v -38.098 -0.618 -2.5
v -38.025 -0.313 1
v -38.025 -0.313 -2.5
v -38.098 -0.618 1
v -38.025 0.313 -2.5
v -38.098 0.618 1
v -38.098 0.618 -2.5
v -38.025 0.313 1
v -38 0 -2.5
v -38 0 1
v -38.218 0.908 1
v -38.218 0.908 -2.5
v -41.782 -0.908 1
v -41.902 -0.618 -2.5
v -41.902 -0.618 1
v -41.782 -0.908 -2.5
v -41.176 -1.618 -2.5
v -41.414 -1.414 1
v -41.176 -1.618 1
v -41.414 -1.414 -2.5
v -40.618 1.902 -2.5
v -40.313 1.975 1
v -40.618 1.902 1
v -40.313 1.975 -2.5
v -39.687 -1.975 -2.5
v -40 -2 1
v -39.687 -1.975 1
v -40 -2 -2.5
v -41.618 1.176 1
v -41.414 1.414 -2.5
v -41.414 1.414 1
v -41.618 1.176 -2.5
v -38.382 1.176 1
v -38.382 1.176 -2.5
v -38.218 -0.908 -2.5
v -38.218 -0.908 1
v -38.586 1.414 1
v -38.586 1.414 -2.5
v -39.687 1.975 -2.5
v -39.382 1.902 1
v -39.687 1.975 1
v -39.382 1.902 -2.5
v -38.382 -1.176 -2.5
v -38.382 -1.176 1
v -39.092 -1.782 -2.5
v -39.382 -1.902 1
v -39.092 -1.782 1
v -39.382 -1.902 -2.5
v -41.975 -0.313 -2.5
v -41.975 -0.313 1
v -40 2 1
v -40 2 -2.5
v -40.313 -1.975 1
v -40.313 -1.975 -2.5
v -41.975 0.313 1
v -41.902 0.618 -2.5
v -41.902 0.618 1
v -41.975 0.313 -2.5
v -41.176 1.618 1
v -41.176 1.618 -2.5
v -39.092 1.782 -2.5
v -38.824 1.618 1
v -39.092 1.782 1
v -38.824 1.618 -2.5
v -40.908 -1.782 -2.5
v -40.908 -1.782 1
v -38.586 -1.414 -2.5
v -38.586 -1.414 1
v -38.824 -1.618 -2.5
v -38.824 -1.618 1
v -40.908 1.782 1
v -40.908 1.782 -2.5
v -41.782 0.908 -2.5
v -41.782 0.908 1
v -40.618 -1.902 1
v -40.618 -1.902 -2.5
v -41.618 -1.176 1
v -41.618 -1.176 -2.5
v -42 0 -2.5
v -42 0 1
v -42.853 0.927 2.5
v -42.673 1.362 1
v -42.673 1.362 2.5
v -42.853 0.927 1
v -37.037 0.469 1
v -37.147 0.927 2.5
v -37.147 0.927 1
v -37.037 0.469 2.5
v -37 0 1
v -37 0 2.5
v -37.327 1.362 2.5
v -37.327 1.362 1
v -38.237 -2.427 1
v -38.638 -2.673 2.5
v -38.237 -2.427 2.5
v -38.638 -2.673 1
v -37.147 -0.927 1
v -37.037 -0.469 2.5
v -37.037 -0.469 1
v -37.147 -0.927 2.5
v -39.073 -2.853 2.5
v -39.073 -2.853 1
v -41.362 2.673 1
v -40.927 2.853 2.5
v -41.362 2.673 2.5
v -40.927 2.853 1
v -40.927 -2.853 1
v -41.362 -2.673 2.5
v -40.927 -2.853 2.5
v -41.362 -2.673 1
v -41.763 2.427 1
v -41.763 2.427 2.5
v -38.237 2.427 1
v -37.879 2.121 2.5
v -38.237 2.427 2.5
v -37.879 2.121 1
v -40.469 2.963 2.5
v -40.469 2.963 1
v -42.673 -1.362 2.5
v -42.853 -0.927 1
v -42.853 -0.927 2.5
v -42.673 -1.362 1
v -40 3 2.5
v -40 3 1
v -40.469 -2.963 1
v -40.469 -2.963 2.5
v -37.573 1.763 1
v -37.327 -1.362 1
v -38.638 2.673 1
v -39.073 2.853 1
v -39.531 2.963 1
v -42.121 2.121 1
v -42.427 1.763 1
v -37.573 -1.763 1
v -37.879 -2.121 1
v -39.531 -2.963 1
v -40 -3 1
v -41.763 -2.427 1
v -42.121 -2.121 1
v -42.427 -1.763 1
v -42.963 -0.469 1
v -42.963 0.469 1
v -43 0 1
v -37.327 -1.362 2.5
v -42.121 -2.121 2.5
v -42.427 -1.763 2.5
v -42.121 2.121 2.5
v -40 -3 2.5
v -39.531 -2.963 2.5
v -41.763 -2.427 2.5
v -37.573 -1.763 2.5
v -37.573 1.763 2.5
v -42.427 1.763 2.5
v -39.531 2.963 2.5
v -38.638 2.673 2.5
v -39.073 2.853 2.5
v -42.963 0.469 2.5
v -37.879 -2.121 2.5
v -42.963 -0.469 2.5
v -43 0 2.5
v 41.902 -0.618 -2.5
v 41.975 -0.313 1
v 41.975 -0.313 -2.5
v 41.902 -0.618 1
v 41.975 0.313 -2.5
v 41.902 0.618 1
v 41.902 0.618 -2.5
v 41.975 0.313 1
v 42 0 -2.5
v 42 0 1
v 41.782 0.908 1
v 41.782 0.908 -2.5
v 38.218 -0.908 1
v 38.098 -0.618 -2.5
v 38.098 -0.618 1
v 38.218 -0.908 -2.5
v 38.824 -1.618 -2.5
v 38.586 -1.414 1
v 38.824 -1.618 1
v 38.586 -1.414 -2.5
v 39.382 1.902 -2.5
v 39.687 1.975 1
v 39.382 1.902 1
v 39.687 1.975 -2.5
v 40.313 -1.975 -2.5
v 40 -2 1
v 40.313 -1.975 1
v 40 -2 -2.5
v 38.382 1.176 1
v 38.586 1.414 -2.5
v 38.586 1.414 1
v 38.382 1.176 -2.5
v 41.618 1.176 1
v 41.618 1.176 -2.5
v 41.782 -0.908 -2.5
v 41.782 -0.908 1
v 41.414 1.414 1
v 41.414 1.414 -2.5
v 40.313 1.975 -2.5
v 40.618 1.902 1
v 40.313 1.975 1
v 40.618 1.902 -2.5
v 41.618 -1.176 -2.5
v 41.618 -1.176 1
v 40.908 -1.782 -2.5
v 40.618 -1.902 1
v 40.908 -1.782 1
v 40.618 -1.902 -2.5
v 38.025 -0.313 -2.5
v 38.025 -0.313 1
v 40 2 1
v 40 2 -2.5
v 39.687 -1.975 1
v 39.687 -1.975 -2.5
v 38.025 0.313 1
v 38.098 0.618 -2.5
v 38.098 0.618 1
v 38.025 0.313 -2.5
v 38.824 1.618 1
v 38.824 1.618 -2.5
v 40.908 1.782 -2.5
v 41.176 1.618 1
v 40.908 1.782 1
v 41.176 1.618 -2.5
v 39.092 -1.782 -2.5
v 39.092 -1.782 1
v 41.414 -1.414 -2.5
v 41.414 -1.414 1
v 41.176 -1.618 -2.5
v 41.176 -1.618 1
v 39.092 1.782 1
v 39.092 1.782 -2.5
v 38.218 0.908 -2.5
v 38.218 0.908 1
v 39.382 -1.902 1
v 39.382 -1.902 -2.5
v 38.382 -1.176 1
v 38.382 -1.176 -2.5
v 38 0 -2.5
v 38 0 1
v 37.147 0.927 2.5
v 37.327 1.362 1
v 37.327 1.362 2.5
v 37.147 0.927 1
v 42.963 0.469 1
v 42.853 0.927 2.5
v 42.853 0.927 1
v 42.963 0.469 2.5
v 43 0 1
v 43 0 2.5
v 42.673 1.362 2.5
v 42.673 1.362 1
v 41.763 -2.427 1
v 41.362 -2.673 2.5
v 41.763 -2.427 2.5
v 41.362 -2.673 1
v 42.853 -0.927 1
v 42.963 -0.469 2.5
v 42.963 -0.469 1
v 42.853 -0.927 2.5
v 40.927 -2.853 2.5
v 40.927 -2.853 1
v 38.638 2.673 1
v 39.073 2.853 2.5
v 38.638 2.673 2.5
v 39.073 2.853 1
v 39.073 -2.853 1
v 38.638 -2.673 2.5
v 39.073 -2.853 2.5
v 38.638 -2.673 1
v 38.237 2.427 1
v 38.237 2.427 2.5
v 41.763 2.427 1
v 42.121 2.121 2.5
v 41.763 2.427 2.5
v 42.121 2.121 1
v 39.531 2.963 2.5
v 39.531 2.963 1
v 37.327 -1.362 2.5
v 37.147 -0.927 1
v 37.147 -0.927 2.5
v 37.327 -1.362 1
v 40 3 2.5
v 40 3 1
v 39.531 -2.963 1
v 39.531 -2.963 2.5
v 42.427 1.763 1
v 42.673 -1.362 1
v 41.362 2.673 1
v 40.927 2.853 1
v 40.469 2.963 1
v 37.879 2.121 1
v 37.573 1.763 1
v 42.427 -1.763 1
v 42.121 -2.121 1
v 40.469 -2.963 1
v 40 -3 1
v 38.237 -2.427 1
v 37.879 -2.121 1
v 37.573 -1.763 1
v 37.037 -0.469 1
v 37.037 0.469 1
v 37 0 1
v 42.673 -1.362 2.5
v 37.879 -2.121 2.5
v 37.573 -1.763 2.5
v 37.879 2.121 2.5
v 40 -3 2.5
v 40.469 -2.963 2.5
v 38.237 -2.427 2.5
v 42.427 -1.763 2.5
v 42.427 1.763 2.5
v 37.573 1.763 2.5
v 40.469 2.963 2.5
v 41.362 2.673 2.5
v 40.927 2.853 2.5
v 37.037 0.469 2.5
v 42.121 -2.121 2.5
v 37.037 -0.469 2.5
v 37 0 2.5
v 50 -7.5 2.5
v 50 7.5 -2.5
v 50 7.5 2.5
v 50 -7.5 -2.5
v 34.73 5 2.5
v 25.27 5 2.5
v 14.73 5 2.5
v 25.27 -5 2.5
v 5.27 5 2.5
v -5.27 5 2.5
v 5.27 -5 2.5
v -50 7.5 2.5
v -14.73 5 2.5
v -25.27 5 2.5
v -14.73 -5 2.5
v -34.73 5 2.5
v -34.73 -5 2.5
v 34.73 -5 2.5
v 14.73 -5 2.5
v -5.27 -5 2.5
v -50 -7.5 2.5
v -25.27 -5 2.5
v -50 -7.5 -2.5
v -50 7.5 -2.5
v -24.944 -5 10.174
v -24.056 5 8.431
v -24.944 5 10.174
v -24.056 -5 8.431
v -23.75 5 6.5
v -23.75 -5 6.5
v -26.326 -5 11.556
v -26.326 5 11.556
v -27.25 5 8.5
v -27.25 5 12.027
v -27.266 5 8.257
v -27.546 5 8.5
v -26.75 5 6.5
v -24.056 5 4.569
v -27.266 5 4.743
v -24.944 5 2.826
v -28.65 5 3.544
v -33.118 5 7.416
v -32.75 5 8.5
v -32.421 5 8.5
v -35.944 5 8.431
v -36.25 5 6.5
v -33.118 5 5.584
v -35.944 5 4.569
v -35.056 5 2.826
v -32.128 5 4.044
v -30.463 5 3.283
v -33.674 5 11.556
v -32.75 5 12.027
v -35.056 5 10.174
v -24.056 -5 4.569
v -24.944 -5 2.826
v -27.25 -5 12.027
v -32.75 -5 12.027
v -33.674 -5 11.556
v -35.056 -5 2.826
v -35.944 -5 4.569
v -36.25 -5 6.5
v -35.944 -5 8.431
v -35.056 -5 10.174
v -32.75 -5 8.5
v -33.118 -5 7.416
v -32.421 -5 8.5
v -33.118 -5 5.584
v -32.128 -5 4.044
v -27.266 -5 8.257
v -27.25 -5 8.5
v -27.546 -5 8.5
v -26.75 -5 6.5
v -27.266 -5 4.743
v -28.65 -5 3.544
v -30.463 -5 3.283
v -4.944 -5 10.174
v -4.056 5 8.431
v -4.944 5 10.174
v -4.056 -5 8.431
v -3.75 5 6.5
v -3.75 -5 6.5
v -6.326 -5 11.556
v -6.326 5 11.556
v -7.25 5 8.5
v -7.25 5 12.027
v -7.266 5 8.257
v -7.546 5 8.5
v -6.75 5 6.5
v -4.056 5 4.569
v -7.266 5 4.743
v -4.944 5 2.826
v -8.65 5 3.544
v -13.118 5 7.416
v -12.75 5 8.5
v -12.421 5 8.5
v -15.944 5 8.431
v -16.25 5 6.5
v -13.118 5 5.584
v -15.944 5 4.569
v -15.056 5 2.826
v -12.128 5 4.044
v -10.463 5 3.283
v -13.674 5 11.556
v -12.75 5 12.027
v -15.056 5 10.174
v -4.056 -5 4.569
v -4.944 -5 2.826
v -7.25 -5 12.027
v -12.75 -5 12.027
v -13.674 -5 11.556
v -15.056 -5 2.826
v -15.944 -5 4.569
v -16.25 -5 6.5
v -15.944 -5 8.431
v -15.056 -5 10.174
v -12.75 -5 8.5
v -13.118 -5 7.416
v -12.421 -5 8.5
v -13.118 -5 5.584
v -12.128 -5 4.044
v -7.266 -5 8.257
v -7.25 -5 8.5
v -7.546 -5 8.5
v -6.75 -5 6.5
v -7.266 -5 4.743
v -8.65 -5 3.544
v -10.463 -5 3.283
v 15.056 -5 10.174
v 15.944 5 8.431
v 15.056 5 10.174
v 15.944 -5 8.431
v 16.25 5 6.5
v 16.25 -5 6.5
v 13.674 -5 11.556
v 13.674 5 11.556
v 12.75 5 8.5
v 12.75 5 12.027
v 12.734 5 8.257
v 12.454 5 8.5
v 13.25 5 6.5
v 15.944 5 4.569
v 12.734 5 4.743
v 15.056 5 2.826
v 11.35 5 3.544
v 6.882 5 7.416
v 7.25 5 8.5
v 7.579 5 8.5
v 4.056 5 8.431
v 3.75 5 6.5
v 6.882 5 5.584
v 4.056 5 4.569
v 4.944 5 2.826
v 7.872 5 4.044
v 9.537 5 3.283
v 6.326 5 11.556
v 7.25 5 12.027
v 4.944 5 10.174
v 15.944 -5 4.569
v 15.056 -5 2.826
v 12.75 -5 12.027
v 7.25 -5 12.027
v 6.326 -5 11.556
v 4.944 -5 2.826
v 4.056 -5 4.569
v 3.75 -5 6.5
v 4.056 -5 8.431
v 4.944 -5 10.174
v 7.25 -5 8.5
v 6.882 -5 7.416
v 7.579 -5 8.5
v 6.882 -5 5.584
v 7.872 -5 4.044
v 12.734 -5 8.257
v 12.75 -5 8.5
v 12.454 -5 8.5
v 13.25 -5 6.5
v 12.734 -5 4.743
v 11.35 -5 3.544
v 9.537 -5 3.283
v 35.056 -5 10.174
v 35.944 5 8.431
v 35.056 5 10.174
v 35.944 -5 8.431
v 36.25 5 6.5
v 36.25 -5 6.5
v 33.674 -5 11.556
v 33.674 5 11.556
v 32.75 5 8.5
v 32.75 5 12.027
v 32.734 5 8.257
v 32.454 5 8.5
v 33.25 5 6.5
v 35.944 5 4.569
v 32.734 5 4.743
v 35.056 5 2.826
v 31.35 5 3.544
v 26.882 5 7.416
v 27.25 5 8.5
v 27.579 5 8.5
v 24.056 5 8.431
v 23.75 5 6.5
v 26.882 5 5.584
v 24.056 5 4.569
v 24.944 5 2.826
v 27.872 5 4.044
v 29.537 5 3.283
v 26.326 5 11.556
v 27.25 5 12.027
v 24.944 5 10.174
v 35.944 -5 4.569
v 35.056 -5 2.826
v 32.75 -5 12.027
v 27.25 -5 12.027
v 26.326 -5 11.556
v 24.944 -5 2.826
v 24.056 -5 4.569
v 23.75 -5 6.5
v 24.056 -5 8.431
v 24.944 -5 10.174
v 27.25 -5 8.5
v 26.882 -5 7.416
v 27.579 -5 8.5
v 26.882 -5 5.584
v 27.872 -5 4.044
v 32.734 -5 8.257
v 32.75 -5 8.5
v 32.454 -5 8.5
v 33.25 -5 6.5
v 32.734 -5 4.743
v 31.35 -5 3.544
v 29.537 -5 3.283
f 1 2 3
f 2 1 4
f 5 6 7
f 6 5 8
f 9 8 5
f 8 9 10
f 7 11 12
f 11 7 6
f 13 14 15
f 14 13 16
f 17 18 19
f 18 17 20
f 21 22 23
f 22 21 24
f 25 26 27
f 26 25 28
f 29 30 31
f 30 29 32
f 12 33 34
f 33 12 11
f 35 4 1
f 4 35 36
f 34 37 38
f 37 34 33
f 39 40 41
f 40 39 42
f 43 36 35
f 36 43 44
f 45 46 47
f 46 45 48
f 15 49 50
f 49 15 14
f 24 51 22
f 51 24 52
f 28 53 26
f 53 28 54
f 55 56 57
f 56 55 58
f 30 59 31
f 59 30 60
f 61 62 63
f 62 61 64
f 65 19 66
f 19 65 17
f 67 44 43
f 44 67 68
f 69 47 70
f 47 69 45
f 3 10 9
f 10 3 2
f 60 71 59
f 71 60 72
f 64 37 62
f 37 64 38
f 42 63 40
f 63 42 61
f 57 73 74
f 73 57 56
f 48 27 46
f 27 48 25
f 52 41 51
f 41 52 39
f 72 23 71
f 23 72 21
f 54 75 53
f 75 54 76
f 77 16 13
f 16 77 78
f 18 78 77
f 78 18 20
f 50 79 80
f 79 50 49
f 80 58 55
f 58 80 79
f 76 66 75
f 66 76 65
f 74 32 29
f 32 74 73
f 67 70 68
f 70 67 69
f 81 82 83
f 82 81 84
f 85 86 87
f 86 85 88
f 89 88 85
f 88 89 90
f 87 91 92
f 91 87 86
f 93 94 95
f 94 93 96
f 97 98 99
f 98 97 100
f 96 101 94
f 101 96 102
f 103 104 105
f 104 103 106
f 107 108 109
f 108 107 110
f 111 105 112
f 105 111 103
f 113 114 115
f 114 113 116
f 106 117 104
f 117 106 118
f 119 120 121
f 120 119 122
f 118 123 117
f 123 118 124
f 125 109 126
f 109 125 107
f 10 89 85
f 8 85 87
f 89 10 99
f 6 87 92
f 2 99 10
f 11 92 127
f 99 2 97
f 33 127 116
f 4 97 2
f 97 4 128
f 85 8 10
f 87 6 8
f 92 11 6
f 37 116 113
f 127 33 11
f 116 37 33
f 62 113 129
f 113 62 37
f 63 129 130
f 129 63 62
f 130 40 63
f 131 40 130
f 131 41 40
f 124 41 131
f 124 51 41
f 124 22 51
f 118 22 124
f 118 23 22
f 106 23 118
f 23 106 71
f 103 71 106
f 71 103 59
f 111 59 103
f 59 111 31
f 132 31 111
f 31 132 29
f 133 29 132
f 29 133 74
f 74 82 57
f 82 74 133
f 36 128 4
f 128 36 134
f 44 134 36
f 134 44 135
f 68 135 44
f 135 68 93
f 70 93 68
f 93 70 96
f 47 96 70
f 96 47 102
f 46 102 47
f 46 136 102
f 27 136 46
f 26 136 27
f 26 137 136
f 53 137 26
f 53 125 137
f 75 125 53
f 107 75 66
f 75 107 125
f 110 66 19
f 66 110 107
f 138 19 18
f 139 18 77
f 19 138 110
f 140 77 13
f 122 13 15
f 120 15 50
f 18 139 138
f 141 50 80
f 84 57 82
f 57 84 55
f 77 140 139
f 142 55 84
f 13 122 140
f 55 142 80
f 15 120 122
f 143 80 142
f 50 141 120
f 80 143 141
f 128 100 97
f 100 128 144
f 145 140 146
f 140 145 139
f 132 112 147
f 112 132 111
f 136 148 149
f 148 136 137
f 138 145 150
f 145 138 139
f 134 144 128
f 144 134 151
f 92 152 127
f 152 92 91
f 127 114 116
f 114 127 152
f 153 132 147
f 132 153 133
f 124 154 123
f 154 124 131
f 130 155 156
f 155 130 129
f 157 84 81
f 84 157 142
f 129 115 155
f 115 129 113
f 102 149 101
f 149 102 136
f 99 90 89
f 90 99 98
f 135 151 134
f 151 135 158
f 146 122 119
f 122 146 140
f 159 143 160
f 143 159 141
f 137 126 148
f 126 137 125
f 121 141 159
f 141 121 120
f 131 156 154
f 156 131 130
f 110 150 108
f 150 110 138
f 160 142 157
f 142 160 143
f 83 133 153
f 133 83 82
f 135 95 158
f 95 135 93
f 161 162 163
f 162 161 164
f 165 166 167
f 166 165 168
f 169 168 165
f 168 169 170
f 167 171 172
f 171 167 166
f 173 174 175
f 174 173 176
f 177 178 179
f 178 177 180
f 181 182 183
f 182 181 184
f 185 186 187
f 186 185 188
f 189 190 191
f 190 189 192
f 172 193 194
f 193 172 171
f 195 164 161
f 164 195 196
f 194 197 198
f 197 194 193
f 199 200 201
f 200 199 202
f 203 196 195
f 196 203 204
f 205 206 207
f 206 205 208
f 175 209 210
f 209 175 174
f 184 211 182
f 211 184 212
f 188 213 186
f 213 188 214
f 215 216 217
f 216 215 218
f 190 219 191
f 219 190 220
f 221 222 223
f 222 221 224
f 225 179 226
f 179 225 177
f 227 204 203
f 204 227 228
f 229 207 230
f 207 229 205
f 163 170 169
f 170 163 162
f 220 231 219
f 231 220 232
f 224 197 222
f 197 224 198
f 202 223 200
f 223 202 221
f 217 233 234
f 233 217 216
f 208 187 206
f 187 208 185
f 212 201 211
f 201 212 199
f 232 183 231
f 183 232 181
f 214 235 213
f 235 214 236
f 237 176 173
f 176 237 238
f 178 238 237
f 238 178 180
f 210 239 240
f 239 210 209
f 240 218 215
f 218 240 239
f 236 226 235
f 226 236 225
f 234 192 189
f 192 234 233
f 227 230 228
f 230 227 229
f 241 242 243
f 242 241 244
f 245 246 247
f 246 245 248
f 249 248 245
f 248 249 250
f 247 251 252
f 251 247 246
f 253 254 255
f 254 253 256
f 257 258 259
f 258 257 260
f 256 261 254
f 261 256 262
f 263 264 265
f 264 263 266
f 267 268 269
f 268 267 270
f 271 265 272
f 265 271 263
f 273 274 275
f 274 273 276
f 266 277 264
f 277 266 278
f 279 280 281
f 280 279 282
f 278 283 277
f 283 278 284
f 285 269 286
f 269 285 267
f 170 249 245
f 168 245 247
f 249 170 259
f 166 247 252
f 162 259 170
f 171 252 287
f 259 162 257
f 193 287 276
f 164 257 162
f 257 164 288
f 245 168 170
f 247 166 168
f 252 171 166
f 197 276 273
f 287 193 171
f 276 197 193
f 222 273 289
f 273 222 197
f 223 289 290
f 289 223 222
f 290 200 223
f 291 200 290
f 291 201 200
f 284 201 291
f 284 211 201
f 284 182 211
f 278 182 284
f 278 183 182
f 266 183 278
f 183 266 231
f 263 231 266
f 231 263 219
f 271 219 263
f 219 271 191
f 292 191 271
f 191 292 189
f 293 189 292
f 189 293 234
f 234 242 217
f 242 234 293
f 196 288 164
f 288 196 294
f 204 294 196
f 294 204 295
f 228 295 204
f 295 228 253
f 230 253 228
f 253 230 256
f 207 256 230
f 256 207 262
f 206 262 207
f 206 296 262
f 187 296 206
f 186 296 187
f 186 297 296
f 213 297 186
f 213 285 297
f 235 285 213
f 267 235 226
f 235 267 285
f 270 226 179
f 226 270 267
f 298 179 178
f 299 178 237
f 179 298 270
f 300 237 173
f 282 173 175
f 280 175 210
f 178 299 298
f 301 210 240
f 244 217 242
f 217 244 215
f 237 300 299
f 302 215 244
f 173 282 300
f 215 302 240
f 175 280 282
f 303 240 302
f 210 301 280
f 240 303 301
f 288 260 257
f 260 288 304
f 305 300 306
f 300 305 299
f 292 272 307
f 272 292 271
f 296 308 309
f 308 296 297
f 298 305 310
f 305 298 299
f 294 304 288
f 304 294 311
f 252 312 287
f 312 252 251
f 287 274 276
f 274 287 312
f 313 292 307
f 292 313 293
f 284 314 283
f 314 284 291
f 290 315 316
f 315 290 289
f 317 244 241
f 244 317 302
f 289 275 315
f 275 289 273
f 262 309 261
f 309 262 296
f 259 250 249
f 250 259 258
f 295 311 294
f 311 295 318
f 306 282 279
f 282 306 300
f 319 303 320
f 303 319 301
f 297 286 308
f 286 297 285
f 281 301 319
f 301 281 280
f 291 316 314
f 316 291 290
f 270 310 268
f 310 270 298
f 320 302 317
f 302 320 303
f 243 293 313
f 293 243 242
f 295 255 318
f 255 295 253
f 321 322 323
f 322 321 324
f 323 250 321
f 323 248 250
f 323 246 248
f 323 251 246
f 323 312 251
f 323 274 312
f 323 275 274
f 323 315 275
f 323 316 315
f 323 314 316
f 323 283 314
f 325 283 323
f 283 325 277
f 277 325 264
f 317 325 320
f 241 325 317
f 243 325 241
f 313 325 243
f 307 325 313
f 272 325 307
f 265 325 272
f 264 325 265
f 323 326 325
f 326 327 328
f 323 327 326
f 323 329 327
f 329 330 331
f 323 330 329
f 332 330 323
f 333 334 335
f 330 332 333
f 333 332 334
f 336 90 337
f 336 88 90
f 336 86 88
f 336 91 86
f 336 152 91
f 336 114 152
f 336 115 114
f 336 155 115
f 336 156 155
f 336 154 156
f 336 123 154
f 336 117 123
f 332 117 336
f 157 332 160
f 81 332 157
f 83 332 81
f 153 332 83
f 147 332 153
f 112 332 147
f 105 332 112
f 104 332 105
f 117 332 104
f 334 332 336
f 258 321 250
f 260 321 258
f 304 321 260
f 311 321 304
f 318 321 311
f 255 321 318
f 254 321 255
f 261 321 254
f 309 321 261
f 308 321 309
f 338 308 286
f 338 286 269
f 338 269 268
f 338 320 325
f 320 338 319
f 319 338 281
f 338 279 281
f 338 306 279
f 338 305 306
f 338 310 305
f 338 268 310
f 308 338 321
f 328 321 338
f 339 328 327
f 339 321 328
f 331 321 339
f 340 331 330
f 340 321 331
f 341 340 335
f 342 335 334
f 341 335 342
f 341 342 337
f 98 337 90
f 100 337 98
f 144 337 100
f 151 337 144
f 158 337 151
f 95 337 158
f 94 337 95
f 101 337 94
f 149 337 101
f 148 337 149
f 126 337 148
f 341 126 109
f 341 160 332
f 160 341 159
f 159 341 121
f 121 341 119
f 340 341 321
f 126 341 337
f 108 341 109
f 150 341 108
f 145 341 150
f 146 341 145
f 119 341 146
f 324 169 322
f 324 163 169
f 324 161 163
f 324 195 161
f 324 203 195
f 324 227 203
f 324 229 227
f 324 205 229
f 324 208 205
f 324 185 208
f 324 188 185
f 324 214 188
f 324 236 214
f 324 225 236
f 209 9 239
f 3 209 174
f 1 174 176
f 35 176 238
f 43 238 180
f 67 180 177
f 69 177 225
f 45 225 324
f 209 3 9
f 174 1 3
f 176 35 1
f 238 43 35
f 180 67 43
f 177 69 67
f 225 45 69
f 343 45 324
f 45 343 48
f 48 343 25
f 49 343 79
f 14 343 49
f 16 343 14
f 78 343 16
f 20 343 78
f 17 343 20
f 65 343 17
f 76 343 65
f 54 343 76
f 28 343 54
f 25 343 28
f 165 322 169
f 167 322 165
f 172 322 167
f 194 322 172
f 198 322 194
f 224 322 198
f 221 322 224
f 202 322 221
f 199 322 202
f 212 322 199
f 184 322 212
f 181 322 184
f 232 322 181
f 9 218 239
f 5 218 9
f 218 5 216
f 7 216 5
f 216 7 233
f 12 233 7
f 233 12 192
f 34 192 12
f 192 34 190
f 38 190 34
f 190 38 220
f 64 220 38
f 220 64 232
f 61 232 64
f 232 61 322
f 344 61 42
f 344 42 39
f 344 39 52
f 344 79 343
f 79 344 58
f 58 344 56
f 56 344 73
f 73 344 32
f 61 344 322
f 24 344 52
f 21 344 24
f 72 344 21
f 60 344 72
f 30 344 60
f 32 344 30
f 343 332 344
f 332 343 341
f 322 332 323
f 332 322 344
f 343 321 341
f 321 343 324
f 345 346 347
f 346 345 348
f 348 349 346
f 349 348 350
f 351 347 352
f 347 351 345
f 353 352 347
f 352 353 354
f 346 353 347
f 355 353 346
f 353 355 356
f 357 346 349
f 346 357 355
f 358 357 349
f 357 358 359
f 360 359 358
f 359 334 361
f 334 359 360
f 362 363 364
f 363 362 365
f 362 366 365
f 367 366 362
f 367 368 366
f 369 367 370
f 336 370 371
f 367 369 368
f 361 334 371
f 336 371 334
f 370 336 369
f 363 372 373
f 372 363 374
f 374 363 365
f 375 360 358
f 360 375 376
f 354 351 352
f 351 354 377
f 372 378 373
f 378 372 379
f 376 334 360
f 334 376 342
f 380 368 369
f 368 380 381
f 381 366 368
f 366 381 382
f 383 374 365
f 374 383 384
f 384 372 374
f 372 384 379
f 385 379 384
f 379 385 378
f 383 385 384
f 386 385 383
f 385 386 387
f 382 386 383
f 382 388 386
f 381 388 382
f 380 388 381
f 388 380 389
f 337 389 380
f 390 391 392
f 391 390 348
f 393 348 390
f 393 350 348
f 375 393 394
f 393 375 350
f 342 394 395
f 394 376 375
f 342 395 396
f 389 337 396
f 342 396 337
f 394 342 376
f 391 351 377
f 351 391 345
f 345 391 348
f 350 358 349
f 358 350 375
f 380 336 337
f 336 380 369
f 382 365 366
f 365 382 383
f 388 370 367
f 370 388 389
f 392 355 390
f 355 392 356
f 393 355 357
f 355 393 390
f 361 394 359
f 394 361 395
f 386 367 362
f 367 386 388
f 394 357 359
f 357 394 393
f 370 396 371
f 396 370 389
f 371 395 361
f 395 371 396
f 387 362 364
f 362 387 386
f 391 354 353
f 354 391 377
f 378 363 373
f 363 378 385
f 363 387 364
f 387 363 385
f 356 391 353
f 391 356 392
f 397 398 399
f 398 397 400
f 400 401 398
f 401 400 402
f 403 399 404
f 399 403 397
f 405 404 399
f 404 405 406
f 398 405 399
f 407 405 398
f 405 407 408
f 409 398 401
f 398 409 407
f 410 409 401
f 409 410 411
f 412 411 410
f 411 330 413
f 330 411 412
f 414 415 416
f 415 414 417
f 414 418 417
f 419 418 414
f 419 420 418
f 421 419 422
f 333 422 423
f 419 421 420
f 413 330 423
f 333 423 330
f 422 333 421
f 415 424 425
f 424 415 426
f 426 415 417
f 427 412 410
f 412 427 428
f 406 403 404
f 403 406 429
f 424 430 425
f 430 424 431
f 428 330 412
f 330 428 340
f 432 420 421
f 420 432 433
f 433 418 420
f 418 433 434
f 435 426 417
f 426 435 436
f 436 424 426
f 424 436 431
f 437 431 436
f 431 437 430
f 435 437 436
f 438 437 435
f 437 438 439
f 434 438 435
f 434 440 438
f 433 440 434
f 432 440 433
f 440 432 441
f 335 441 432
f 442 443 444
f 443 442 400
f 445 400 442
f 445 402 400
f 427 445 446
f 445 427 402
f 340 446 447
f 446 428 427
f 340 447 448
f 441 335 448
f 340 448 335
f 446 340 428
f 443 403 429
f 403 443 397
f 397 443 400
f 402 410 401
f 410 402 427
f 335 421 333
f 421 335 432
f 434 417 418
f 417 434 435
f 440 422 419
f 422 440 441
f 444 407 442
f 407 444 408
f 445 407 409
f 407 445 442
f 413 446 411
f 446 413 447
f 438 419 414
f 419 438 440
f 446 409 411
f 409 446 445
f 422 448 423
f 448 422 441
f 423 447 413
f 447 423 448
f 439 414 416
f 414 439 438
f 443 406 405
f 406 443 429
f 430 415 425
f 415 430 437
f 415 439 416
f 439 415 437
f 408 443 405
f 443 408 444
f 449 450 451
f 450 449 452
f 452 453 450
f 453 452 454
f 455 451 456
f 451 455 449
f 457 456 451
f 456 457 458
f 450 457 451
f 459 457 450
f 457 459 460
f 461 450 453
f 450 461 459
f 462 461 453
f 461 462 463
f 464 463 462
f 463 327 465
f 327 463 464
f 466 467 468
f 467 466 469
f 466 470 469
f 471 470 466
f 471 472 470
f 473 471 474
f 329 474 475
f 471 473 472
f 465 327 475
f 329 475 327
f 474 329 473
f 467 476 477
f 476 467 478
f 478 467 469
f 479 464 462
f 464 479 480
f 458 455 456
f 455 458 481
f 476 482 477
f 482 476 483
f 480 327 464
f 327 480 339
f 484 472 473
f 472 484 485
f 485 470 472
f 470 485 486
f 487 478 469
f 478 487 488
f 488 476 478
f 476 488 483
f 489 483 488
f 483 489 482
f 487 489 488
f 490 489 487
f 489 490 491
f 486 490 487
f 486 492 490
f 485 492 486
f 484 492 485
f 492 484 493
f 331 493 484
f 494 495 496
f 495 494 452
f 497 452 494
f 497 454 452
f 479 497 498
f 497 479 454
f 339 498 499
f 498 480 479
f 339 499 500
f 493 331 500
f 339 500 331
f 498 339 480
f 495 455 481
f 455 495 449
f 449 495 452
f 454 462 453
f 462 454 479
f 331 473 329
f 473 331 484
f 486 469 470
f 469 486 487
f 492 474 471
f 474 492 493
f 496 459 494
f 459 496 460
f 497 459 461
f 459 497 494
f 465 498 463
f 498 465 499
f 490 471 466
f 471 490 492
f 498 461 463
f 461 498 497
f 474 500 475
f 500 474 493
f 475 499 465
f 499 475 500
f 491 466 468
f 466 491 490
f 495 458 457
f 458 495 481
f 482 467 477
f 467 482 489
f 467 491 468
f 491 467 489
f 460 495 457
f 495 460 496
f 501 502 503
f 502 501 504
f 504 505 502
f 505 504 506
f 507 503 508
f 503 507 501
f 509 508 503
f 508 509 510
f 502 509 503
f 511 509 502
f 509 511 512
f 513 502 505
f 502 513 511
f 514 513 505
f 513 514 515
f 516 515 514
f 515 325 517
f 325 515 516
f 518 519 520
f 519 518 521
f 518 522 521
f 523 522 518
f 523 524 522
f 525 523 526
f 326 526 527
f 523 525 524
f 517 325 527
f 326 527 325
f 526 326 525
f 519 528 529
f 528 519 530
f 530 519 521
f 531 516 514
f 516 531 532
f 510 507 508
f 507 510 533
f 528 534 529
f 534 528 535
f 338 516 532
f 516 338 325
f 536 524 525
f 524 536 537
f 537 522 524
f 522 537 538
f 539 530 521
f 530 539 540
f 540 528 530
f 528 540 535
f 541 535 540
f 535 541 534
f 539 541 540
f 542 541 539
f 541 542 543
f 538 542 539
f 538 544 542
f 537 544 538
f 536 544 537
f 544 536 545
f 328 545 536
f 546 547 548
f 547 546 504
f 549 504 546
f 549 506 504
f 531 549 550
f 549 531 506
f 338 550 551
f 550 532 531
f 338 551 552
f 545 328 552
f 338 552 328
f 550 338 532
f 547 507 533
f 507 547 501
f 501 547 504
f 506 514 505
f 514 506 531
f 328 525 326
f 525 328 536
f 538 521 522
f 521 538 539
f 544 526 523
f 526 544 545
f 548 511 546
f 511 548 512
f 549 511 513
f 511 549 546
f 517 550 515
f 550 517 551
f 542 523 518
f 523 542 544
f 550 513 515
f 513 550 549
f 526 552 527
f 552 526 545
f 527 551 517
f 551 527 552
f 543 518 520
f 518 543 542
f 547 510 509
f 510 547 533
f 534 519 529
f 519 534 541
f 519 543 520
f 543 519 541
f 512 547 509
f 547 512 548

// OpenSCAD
// Solarkabelklemme


module Loch() {
    
   cylinder(d=4,h=20,center=true,$fn=40);
   translate([0,0,11])
   cylinder(d=6,h=20,center=true,$fn=40);

}

module Base(n) {
    
    difference() {
        cube([20+n*20,15,5],center=true);
        translate([-n*10,0,0])
        Loch();
        translate([n*10,0,0])
        Loch();
    }
    
    for (i=[0:1:n-1])
        translate([-(n-1)*10+i*20,0,0])
        Snap(6.5);
}


module Snap(ri) {
    rotate([90,0,0])
    translate([0,6.5,0])
    difference(){
        cylinder(d=ri+6,h=10,center=true);
        cylinder(d=ri,h=11,center=true);
        translate([0,7,0])
        cube([5.5,10,15],center=true);
    }
}

Base(4);
